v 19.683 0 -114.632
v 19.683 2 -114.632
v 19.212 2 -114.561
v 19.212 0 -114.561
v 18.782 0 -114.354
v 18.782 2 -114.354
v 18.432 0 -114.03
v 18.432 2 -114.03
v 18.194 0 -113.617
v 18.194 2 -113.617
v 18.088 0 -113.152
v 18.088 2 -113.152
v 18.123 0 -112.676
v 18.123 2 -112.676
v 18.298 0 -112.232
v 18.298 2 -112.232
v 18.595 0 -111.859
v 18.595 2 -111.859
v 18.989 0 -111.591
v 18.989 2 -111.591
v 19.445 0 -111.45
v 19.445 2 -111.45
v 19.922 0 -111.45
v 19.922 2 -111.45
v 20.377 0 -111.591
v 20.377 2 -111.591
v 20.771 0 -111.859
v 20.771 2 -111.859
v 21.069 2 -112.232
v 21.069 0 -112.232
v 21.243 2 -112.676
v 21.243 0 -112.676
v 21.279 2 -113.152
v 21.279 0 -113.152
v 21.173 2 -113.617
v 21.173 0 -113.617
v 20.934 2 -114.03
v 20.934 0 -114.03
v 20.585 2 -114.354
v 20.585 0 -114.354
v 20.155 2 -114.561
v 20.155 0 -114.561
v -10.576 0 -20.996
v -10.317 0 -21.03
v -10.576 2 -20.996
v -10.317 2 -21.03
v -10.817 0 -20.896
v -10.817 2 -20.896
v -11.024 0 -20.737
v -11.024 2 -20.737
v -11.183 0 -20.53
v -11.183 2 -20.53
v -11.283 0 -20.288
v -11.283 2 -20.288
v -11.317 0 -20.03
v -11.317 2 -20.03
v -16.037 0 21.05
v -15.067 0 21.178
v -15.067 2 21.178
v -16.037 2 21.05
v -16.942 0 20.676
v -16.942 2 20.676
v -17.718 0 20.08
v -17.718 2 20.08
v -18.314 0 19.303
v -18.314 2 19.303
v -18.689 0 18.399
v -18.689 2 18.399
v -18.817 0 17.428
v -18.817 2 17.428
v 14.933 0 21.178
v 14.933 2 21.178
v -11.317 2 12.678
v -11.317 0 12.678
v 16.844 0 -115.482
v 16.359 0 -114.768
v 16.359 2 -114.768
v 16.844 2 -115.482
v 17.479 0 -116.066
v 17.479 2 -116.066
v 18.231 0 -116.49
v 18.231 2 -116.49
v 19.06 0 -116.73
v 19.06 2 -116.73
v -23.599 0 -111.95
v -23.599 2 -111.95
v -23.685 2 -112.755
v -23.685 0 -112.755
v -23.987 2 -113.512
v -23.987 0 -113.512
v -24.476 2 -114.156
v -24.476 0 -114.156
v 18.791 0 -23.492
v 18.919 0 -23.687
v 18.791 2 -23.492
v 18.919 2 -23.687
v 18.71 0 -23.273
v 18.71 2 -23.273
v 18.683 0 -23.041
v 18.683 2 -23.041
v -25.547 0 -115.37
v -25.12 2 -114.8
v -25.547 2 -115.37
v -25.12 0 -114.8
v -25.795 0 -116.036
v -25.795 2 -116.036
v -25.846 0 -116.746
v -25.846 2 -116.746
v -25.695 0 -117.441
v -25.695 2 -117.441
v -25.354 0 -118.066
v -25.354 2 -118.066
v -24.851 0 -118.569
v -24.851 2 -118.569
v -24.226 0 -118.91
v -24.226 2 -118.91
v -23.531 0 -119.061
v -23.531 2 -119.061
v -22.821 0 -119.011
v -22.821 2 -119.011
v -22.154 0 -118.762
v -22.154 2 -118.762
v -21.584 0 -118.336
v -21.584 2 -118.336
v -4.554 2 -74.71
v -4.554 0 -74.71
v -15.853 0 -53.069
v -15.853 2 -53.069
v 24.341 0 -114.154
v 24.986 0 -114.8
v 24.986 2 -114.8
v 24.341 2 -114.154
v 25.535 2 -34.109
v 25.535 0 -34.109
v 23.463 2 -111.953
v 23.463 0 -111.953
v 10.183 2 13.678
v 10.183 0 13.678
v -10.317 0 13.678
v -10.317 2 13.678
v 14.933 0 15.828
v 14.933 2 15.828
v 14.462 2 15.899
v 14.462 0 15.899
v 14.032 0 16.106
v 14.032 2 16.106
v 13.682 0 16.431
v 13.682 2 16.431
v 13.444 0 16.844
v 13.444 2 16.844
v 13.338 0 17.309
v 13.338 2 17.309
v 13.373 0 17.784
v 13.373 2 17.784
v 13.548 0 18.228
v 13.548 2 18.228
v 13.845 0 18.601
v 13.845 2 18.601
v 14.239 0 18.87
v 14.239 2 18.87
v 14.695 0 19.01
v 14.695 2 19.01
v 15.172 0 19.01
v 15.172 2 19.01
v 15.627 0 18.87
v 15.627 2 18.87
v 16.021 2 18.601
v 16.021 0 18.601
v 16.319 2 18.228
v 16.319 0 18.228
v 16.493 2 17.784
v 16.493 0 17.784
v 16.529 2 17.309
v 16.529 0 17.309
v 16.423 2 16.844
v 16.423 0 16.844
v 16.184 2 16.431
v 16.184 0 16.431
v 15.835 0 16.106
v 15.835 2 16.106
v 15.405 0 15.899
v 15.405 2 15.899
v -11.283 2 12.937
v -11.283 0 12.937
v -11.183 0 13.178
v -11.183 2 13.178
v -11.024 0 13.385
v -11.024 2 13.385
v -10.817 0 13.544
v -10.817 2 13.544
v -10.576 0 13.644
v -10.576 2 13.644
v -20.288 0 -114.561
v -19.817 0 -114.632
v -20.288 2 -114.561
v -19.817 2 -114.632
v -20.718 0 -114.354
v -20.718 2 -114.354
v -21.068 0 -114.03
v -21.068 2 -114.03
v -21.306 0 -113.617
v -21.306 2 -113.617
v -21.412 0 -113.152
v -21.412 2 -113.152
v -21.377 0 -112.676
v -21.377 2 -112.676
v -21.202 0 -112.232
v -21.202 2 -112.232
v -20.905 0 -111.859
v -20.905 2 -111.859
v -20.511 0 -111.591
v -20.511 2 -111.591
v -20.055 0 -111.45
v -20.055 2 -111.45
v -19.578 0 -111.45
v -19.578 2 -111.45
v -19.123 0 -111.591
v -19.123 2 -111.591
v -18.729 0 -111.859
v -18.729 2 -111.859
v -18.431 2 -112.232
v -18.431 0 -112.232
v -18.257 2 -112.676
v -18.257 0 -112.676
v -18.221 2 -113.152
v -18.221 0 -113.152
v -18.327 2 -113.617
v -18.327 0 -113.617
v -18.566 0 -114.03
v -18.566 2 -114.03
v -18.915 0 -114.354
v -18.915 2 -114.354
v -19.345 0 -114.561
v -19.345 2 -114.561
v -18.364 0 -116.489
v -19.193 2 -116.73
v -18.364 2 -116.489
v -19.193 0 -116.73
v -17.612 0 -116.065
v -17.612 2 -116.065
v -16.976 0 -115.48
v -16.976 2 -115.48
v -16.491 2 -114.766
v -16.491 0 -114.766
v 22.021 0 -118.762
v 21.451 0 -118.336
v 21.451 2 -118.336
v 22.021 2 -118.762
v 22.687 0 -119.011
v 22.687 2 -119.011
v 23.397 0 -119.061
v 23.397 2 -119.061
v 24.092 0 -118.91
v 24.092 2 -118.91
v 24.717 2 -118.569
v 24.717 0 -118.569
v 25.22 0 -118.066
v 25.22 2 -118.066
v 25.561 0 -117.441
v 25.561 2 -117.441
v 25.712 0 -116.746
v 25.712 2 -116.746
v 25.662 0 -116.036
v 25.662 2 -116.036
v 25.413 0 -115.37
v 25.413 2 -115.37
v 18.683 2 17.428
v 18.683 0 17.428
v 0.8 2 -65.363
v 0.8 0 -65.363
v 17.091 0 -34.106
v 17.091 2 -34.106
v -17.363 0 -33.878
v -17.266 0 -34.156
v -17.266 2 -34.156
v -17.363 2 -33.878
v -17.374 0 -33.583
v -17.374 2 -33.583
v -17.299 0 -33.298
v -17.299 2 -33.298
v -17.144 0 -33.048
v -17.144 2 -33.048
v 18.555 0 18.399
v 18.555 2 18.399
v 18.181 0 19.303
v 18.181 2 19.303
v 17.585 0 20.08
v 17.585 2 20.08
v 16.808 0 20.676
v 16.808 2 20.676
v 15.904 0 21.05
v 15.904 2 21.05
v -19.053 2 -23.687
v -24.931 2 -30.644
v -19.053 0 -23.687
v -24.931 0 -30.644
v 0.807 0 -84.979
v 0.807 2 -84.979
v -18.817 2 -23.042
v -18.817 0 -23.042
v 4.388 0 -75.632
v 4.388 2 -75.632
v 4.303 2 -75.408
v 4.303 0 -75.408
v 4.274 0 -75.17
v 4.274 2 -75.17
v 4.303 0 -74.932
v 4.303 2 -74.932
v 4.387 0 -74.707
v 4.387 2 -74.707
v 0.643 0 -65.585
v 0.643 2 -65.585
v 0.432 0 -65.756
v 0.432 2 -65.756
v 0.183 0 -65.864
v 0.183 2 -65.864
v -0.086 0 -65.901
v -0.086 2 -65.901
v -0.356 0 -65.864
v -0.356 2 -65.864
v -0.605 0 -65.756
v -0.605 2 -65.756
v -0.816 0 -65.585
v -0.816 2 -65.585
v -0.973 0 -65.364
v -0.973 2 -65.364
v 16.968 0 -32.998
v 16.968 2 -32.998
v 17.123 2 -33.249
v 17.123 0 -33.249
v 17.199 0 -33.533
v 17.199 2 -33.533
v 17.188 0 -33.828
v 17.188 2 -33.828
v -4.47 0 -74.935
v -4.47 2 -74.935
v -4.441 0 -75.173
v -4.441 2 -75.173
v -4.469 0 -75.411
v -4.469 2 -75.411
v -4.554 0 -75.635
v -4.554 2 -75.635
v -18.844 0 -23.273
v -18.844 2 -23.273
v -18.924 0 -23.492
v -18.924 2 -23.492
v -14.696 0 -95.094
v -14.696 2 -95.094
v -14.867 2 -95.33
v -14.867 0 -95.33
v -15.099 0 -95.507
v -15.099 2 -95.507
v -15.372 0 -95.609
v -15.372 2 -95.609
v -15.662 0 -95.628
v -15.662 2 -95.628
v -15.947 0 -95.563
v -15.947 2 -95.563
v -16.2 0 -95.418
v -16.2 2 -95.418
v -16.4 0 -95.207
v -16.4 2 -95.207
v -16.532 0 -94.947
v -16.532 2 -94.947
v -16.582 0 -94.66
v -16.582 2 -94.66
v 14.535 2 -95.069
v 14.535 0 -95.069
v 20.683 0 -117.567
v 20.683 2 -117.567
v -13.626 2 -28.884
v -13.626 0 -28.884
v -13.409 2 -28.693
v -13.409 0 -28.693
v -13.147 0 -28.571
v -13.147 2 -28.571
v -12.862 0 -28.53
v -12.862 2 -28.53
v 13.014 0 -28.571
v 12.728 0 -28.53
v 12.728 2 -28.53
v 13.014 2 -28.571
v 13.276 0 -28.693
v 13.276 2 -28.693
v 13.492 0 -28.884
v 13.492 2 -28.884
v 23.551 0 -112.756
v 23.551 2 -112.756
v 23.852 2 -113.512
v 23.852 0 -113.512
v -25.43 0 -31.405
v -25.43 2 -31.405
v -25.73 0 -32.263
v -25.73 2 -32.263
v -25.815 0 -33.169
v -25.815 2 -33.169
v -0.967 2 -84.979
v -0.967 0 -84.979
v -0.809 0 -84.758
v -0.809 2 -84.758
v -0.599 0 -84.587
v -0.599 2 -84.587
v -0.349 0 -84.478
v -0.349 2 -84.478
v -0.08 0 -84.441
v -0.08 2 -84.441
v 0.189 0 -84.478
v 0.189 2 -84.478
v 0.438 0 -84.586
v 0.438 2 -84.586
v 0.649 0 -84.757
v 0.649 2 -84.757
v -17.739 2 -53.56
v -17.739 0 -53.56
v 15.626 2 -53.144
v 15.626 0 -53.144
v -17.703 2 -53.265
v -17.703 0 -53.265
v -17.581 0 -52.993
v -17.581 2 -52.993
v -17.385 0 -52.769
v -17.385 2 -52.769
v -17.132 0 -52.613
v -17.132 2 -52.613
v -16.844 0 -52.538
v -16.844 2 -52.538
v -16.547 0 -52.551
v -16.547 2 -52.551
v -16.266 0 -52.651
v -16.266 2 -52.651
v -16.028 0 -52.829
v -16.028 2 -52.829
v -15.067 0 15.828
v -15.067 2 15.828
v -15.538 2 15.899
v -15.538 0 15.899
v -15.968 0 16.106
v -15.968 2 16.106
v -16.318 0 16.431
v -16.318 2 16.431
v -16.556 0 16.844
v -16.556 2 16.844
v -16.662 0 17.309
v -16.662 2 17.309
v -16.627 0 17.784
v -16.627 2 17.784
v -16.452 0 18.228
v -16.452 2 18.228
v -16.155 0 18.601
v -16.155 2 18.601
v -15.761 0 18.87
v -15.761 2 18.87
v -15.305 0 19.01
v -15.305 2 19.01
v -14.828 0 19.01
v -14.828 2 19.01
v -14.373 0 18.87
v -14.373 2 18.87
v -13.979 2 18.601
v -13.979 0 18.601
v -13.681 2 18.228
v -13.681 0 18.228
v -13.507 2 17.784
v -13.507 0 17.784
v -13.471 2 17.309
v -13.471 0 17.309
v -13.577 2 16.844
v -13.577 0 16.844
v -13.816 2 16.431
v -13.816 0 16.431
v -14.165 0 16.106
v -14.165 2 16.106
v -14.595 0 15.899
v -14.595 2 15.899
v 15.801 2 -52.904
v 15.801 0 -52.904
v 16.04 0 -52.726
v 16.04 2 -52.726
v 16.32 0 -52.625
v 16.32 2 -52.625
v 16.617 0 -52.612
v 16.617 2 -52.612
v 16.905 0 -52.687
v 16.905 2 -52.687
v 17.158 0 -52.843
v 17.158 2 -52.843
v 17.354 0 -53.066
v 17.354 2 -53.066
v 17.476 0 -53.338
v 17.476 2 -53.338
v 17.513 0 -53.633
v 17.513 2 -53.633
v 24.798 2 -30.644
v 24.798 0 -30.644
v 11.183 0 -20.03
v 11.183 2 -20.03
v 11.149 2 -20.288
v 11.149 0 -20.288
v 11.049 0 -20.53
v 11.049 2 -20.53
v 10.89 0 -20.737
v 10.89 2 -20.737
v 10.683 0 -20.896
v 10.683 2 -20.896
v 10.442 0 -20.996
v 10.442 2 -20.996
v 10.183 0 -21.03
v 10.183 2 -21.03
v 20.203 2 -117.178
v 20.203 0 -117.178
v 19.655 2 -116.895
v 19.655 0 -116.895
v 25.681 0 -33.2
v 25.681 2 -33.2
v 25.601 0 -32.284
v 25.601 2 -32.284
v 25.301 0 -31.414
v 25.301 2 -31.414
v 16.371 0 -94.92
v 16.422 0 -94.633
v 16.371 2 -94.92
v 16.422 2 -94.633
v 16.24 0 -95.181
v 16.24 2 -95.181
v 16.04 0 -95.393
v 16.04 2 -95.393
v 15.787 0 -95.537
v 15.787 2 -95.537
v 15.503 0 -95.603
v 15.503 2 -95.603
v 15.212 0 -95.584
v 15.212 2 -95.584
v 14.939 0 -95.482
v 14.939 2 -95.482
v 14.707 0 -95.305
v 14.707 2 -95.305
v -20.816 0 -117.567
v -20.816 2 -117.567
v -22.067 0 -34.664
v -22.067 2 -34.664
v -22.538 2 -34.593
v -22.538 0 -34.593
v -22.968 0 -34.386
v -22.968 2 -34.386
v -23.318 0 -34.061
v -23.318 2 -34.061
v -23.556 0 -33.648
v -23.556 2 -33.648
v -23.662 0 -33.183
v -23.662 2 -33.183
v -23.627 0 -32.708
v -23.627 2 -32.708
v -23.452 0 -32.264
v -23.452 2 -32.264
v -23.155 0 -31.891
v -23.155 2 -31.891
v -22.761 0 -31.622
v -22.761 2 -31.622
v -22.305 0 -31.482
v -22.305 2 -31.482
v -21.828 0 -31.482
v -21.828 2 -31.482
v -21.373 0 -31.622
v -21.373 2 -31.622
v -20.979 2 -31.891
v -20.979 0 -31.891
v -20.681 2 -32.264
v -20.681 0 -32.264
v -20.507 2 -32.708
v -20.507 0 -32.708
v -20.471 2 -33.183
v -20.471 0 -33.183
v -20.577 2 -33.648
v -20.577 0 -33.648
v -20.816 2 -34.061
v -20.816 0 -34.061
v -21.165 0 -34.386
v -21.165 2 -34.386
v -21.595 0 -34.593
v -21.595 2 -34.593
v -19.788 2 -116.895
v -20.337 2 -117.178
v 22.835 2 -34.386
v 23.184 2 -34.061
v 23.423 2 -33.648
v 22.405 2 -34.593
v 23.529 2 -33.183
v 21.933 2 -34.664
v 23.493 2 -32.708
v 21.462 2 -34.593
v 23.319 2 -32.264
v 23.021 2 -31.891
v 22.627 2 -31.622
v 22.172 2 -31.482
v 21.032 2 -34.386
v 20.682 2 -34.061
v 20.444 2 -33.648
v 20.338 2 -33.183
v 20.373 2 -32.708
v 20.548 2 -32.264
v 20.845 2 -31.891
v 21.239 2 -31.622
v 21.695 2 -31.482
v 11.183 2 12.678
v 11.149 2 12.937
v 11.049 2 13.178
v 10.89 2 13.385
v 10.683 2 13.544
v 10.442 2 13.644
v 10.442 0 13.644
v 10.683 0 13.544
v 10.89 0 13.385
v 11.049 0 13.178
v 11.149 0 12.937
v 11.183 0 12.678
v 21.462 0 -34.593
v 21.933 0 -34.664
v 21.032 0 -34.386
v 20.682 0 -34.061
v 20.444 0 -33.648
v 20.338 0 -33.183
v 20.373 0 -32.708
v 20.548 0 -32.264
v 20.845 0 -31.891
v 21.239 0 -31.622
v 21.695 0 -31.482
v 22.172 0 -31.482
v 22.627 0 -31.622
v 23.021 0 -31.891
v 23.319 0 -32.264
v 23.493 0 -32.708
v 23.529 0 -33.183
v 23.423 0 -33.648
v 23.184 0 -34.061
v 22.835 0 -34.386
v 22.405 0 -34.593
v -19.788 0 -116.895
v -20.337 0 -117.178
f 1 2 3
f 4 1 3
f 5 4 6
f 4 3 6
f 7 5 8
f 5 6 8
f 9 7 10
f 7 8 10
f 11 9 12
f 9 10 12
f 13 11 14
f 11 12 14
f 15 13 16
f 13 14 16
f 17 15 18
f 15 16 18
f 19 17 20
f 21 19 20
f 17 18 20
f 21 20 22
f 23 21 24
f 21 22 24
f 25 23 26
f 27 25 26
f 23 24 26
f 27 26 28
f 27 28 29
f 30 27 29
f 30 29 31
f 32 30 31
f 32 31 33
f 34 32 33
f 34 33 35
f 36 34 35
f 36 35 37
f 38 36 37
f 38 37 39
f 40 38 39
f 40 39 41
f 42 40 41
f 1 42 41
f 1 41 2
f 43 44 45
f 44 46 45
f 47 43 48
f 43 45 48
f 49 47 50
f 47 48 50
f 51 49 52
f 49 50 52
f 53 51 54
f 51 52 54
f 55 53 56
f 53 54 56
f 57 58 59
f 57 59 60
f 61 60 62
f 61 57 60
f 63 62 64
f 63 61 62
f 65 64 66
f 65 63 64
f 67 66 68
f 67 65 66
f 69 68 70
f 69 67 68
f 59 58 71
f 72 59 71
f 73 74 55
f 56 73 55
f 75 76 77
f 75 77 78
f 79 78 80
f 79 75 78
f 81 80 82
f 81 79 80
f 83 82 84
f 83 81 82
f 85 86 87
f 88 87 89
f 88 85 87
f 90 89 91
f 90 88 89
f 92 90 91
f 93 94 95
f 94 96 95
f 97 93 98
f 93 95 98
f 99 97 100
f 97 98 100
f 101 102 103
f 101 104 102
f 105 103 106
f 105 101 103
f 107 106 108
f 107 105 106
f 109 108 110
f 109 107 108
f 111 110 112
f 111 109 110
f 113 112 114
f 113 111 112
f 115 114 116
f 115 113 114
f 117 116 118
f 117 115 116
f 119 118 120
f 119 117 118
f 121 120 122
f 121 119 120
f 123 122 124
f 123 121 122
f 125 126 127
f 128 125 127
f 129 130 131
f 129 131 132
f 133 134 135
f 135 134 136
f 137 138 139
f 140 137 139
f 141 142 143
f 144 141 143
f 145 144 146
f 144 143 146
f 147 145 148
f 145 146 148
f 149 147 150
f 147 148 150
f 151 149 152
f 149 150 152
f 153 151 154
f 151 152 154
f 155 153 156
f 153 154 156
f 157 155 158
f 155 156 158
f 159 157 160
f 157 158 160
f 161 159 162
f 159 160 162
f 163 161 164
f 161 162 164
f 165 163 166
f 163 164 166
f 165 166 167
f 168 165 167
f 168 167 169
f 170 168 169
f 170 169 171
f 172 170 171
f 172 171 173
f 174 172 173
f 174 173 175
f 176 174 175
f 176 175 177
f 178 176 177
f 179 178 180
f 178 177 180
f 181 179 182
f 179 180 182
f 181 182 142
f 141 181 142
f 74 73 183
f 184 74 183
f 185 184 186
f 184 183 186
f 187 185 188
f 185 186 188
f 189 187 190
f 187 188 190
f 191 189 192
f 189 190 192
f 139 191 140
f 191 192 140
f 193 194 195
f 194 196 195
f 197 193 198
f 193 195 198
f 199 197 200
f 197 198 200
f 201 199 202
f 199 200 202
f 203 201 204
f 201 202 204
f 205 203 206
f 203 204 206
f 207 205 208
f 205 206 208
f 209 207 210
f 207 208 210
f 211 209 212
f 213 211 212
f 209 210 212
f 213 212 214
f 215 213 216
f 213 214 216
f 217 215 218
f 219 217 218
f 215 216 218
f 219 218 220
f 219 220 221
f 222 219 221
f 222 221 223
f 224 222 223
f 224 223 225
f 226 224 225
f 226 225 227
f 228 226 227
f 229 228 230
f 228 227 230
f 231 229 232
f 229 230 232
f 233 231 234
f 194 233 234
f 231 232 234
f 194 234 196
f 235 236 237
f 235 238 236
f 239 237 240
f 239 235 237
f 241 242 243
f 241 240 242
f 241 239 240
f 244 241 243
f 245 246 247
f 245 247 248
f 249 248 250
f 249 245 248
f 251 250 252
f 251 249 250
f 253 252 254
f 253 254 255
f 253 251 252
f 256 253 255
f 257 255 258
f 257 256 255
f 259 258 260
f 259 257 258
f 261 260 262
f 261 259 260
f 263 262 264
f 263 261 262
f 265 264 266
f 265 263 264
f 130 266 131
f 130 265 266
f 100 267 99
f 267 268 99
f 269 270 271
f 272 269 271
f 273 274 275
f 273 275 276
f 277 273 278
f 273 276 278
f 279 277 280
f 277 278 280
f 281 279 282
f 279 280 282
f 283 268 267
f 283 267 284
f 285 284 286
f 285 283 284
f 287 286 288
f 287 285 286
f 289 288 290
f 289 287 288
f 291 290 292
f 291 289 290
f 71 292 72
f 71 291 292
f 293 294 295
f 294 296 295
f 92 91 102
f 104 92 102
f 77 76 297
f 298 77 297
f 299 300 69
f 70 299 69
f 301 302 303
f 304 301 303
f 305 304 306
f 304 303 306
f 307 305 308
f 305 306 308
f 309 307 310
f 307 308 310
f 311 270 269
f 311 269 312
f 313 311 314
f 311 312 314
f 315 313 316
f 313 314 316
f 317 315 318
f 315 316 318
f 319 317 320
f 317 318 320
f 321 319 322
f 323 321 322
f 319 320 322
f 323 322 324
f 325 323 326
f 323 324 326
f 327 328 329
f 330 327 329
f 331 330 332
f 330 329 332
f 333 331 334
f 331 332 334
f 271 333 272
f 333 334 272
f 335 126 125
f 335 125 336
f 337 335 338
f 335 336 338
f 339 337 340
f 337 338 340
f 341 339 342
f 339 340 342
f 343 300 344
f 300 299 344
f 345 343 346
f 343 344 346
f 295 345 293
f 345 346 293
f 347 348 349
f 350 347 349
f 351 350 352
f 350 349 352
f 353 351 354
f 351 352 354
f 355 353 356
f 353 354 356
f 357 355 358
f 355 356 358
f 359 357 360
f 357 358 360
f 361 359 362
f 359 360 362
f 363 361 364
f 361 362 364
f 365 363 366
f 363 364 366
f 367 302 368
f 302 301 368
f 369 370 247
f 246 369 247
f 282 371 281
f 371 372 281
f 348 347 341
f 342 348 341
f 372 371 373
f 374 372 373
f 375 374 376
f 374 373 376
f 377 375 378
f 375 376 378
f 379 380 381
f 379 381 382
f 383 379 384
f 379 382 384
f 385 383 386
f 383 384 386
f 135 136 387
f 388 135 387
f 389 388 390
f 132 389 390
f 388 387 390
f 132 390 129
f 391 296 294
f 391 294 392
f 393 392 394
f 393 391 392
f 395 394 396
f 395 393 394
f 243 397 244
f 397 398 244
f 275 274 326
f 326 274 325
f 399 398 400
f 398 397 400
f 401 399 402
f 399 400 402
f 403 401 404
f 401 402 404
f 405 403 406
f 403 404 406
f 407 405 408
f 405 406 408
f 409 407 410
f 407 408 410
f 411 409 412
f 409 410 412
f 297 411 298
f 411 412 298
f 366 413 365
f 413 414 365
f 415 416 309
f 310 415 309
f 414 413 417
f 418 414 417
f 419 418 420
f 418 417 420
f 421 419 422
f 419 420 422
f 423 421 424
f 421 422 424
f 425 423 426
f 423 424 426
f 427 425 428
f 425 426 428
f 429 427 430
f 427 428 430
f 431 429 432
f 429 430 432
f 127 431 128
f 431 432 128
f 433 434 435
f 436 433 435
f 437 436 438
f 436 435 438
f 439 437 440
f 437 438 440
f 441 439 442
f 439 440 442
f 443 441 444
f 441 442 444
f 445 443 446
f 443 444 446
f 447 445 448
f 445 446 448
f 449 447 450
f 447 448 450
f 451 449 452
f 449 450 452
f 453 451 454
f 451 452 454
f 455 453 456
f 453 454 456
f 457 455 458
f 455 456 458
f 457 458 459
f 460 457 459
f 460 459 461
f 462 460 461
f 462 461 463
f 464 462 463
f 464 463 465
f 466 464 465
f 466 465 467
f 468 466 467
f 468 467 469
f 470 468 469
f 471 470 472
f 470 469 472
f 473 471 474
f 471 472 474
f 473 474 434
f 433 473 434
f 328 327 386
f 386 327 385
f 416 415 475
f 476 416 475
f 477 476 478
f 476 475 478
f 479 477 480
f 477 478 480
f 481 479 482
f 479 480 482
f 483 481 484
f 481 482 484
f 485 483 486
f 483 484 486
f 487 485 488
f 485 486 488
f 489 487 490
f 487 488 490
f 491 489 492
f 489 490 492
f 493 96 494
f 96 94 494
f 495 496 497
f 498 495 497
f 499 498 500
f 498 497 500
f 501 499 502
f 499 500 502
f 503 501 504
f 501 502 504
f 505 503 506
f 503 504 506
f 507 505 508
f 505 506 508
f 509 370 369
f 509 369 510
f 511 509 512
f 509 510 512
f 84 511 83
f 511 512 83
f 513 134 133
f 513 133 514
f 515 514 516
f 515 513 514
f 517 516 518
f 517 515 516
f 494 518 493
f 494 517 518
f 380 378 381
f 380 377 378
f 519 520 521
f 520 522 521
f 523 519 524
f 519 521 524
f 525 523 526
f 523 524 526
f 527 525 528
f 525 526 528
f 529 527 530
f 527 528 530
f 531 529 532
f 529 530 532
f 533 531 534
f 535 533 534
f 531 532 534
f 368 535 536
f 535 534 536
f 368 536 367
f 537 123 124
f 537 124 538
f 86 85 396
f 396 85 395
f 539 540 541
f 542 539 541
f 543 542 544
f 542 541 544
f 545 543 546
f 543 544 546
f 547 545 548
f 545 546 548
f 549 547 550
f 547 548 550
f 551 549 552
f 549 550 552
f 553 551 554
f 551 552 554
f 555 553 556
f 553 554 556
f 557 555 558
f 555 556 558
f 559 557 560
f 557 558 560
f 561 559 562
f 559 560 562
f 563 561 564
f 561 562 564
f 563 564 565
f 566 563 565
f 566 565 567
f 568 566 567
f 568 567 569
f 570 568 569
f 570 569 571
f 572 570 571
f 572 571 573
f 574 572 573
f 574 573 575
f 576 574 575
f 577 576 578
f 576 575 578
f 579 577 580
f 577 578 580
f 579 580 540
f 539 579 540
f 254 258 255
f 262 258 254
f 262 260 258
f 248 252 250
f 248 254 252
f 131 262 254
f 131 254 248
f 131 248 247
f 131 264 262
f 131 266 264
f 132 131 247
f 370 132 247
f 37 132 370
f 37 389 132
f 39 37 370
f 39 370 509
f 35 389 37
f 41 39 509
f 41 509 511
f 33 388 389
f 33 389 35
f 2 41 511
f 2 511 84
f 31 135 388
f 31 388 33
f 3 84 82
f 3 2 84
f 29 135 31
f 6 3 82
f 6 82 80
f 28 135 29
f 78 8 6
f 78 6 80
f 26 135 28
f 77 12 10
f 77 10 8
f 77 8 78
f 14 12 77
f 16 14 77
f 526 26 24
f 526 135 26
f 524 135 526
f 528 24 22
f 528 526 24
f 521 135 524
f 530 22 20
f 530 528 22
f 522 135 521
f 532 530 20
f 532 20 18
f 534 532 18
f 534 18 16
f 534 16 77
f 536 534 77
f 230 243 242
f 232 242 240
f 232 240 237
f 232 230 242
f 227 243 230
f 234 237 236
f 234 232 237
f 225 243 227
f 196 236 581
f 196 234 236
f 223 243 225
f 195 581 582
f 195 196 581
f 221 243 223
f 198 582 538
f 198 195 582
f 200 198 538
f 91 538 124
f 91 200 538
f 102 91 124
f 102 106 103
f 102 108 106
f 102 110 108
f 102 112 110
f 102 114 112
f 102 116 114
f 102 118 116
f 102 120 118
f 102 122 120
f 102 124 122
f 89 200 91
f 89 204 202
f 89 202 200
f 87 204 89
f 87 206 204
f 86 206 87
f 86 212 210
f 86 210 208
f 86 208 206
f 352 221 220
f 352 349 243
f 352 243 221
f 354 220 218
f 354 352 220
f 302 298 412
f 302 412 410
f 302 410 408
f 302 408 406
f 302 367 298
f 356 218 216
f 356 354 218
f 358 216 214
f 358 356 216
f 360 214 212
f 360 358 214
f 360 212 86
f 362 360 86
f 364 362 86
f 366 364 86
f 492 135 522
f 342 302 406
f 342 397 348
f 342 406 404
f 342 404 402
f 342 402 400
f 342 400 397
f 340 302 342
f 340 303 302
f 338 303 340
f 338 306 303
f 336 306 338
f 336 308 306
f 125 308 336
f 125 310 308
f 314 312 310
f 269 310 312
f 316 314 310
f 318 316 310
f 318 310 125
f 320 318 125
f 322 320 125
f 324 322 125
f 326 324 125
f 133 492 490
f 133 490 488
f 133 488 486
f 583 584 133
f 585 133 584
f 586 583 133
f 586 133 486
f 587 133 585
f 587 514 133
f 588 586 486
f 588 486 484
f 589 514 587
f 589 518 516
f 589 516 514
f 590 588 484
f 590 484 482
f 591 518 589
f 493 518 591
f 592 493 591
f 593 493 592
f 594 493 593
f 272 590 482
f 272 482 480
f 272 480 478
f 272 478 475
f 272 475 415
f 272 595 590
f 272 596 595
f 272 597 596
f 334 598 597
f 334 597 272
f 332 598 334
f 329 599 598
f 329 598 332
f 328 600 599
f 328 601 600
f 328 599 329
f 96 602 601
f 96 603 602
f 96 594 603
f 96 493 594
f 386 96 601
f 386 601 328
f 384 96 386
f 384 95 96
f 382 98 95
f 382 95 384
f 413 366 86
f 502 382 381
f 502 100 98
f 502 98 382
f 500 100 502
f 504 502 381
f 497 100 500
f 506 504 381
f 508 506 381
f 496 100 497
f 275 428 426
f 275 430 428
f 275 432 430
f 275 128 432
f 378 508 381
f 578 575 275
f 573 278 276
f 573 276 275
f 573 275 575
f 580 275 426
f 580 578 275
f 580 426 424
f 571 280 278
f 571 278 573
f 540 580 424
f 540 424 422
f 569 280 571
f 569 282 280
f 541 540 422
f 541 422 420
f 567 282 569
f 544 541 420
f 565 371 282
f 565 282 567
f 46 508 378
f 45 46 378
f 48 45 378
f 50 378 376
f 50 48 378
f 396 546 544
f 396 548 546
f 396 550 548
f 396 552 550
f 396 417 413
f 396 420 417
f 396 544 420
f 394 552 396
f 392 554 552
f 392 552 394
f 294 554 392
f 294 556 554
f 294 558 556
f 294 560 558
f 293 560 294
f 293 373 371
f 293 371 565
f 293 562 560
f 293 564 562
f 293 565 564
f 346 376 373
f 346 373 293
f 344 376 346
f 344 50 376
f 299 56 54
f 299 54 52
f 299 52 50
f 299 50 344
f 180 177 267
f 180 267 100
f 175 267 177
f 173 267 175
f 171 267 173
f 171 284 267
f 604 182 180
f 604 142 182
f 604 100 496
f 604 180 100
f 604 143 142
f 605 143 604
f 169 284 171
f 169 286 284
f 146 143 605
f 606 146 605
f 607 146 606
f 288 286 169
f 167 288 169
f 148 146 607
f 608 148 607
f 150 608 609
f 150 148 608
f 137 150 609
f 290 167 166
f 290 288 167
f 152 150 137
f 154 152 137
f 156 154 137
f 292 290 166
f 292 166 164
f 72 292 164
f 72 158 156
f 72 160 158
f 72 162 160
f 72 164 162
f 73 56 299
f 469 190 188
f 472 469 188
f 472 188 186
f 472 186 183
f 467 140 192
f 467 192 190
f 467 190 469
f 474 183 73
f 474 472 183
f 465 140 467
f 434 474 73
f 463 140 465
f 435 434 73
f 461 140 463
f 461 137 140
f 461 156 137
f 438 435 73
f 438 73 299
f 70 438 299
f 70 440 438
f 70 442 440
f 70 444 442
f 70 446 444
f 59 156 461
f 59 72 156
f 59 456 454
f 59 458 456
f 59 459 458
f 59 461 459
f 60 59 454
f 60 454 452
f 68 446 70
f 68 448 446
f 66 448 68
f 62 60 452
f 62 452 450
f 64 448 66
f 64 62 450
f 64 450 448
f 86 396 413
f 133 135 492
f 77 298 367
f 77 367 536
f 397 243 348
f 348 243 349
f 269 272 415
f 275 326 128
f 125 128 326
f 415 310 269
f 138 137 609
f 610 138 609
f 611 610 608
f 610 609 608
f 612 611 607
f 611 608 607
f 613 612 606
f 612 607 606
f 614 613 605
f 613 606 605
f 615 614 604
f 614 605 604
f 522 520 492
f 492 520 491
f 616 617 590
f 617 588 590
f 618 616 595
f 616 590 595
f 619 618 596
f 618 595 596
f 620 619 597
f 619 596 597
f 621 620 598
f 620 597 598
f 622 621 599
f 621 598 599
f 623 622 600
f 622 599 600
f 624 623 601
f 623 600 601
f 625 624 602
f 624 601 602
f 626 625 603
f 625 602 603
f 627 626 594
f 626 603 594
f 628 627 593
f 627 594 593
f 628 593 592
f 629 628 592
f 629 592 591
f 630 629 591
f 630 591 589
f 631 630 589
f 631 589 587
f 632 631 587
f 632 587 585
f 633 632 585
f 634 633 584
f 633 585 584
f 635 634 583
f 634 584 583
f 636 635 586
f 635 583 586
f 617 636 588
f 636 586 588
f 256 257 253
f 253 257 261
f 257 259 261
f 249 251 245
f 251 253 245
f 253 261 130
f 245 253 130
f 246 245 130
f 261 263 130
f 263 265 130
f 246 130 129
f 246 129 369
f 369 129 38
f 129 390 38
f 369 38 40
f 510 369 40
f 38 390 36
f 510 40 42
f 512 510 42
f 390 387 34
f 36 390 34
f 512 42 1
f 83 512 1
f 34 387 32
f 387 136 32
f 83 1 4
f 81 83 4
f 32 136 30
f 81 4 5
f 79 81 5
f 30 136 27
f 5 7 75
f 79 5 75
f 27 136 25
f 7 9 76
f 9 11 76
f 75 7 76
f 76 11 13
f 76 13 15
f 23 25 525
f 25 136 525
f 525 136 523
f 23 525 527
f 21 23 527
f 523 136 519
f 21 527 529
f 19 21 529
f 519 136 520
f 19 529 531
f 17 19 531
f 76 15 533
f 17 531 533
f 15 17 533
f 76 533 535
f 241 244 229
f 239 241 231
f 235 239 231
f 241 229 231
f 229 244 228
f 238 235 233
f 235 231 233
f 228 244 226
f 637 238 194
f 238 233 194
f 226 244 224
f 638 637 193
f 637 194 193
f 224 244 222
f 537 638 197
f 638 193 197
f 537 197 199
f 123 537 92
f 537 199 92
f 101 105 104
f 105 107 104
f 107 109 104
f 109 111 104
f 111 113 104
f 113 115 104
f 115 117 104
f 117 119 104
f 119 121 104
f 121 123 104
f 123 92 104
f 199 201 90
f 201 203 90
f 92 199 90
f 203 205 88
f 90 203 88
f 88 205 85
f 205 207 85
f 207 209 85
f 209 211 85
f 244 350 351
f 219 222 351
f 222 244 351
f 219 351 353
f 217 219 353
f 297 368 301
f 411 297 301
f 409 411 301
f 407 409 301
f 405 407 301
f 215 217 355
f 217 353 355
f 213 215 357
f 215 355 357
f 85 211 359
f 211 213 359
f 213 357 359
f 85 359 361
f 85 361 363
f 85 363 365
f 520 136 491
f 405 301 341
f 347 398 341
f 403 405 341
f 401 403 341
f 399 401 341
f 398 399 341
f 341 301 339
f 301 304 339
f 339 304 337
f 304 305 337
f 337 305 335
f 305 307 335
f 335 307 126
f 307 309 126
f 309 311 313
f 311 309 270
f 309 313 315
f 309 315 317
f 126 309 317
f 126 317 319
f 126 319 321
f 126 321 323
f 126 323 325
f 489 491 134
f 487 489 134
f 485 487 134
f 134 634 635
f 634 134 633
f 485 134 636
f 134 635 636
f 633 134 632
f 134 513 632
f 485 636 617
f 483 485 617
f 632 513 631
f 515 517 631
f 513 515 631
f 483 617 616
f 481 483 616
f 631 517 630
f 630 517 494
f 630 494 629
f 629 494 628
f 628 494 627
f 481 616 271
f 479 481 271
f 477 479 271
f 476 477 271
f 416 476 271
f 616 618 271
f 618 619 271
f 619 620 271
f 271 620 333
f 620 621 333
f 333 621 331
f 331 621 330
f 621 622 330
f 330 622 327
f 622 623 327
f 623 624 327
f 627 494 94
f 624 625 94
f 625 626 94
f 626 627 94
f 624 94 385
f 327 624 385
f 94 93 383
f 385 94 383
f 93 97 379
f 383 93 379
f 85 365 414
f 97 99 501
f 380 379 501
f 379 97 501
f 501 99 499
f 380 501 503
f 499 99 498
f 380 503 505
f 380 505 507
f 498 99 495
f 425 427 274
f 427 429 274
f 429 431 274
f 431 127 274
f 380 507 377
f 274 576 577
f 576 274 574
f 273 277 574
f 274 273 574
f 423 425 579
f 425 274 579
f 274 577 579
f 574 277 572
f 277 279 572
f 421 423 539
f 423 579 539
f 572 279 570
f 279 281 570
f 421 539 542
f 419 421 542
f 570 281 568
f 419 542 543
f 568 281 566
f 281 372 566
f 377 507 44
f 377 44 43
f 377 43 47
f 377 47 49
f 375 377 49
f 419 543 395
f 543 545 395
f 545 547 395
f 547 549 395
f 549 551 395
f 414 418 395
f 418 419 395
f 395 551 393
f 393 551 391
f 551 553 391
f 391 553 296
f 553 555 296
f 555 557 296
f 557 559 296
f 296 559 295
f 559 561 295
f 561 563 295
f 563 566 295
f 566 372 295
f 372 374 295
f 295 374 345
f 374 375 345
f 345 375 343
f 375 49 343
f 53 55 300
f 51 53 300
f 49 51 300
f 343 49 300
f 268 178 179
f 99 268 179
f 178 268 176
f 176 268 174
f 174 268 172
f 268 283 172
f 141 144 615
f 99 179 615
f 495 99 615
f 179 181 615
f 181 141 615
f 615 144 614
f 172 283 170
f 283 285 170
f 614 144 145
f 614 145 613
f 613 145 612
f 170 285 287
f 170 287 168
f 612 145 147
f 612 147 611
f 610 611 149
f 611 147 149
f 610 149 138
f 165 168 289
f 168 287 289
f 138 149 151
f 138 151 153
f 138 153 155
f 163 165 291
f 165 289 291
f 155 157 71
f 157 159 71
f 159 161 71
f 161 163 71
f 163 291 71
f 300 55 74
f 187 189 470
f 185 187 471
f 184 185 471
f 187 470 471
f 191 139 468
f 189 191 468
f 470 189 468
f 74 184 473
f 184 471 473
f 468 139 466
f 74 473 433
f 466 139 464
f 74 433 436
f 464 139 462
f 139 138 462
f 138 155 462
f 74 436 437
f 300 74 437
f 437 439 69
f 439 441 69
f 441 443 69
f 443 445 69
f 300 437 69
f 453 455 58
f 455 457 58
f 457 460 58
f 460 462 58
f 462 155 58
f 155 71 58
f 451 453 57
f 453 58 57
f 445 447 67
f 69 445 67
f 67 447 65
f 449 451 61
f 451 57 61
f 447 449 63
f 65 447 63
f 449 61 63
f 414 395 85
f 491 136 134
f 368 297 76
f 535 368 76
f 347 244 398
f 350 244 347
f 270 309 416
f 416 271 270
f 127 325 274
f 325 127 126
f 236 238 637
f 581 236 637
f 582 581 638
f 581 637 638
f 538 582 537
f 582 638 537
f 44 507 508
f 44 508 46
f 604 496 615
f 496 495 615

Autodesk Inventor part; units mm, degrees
ref_plane "YZ Plane" through (0, 0, 0) normal (1, 0, 0) x (0, 1, 0)
ref_plane "XZ Plane" through (0, 0, 0) normal (0, 1, 0) x (-1, 0, 0)
ref_plane "XY Plane" through (0, 0, 0) normal (0, 0, 1) x (1, 0, 0)
sketch "Szkic1" plane through (0, 0, 0) normal (0, 1, 0) x (-1, 0, 0)
  line L0 (-14.9332, 17.4281) -> (15.0668, 17.4281) construction
  line L1 (-14.9332, 13.6781) -> (15.0668, 13.6781)
  line L2 (15.0668, 21.1781) -> (-14.9332, 21.1781)
  arc A0 (-14.9332, 21.1781) -> (-14.9332, 13.6781) centre (-14.9332, 17.4281) ccw
  arc A1 (15.0668, 13.6781) -> (15.0668, 21.1781) centre (15.0668, 17.4281) ccw
  line L3 (0.0668, 17.4281) -> (0.0668, -37.9617) construction
  line L4 (15.0668, 17.4281) -> (15.0668, -55.6314) construction
  line L5 (-14.9332, 17.4281) -> (-14.9332, -55.6314) construction
  line L6 (22.0668, -33.0639) -> (15.0668, -24.7796) construction
  line L7 (24.9311, -30.6436) -> (17.9311, -22.3593)
  line L8 (12.2024, -27.1999) -> (19.2024, -35.4842)
  arc A2 (19.2024, -35.4842) -> (24.9311, -30.6436) centre (22.0668, -33.0639) ccw
  arc A3 (17.9311, -22.3593) -> (12.2024, -27.1999) centre (15.0668, -24.7796) ccw
  line L9 (-21.9332, -33.0639) -> (-14.9332, -24.7796) construction
  line L10 (-19.0689, -35.4842) -> (-12.0689, -27.1999)
  line L11 (-17.7976, -22.3593) -> (-24.7976, -30.6436)
  arc A4 (-24.7976, -30.6436) -> (-19.0689, -35.4842) centre (-21.9332, -33.0639) ccw
  arc A5 (-12.0689, -27.1999) -> (-17.7976, -22.3593) centre (-14.9332, -24.7796) ccw
  line L12 (15.0668, 17.4281) -> (15.0668, -24.7796) construction
  line L13 (11.3168, 17.4281) -> (11.3168, -24.7796)
  line L14 (18.8168, -24.7796) -> (18.8168, 17.4281)
  arc A6 (18.8168, 17.4281) -> (11.3168, 17.4281) centre (15.0668, 17.4281) ccw
  arc A7 (11.3168, -24.7796) -> (18.8168, -24.7796) centre (15.0668, -24.7796) ccw
  line L15 (-14.9332, 17.4281) -> (-14.9332, -24.7796) construction
  line L16 (-18.6832, 17.4281) -> (-18.6832, -24.7796)
  line L17 (-11.1832, -24.7796) -> (-11.1832, 17.4281)
  arc A8 (-11.1832, 17.4281) -> (-18.6832, 17.4281) centre (-14.9332, 17.4281) ccw
  arc A9 (-18.6832, -24.7796) -> (-11.1832, -24.7796) centre (-14.9332, -24.7796) ccw
  line L18 (-14.9332, -24.7796) -> (15.0668, -24.7796) construction
  line L19 (-14.9332, -21.0296) -> (15.0668, -21.0296)
  line L20 (15.0668, -28.5296) -> (-14.9332, -28.5296)
  arc A10 (-14.9332, -21.0296) -> (-14.9332, -28.5296) centre (-14.9332, -24.7796) ccw
  arc A11 (15.0668, -28.5296) -> (15.0668, -21.0296) centre (15.0668, -24.7796) ccw
  line L21 (22.0668, -33.0639) -> (19.8168, -113.0323) construction
  line L22 (18.3183, -32.9584) -> (16.0683, -112.9268)
  line L23 (23.5653, -113.1377) -> (25.8153, -33.1694)
  arc A12 (25.8153, -33.1694) -> (18.3183, -32.9584) centre (22.0668, -33.0639) ccw
  arc A13 (16.0683, -112.9268) -> (23.5653, -113.1377) centre (19.8168, -113.0323) ccw
  line L24 (-21.8084, -33.1694) -> (-19.6832, -113.0323) construction
  line L25 (-25.5571, -33.2691) -> (-23.4319, -113.132)
  line L26 (-15.9346, -112.9325) -> (-18.0597, -33.0696)
  arc A14 (-18.0597, -33.0696) -> (-25.5571, -33.2691) centre (-21.8084, -33.1694) ccw
  arc A15 (-23.4319, -113.132) -> (-15.9346, -112.9325) centre (-19.6832, -113.0323) ccw
  line L27 (22.0668, -33.0639) -> (-19.6832, -113.0323) construction
  line L28 (18.7425, -31.3284) -> (-23.0075, -111.2967)
  line L29 (-16.359, -114.7678) -> (25.391, -34.7994)
  arc A16 (25.391, -34.7994) -> (18.7425, -31.3284) centre (22.0668, -33.0639) ccw
  arc A17 (-23.0075, -111.2967) -> (-16.359, -114.7678) centre (-19.6832, -113.0323) ccw
  line L30 (-21.8084, -33.1694) -> (19.8168, -113.0323) construction
  line L31 (-25.1338, -34.9026) -> (16.4914, -114.7655)
  line L32 (23.1422, -111.299) -> (-18.483, -31.4361)
  arc A18 (-18.483, -31.4361) -> (-25.1338, -34.9026) centre (-21.8084, -33.1694) ccw
  arc A19 (16.4914, -114.7655) -> (23.1422, -111.299) centre (19.8168, -113.0323) ccw
  point P0 (0, 0)
  point P1 (18.5668, -28.9217)
  point P2 (-18.4332, -28.9217)
  point P3 (15.0668, -3.6757)
  point P4 (-14.9332, -3.6757)
  point P5 (0.0668, -24.7796)
  point P6 (20.9418, -73.0481)
  point P7 (-20.7458, -73.1008)
  point P8 (1.1918, -73.0481)
  point P9 (-0.9958, -73.1008)
  point P10 (-18.6832, -23.4074)
  point P11 (-25.5347, -34.1087)
  point P12 (0.0805, -83.2794)
  point P13 (24.9311, -30.6436)
  point P14 (18.8168, -23.4074)
  point P15 (4.3129, -75.1727)
  point P16 (17.8606, -49.2232)
  point P17 (16.474, -98.5053)
  point P18 (-4.1462, -75.1698)
  point P19 (-16.319, -98.4856)
  point P20 (-17.6277, -49.3039)
  point P21 (0.0861, -67.0631)
  point P22 (-17.4016, -33.511)
  point P23 (-13.1924, -28.5296)
  point P24 (13.3259, -28.5296)
  point P25 (17.5771, -33.5607)
  point P26 (11.3168, 13.6781)
  point P27 (11.3168, -21.0296)
  point P28 (-11.1832, -21.0296)
  point P29 (-11.1832, 13.6781)
  dimension "d0" = 7.5
  dimension "d1" = 7.5
  dimension "d2" = 7.5
  dimension "d3" = 7.5
  dimension "d4" = 7.5
  dimension "d5" = 7.5
  dimension "d6" = 7.5
extrude "Wyciągnięcie proste1" add sketch "Szkic1" along normal blind 2 contours A0 A8 L17 L1 | L1 L17 L19 A5 L11 L16 A0 | L17 A8 L2 A6 L13 L1 | L13 A6 A1 L1 | L1 A1 L14 L7 A3 L19 L13 | L19 L13 A3 L8 L20 L10 A5 L17 | L17 A5 L19 | L16 A9 L20 L10 L32 A14 L25 A4 L11 | L11 A10 L16 | L19 A3 L13 | A5 A9 A10 | A3 A11 A7 | L10 L20 A9 | L25 A18 L31 A4 | A4 L31 L26 L28 A17 L25 | L14 A11 L7 | L7 A12 L28 L8 L20 A7 L14 | A7 L20 L8 | L31 A18 A14 L26 L10 A4 | A4 L10 L26 L31 | A17 L28 L26 A15 | A2 L8 L22 A12 | L32 L28 L31 L26 L10 | L10 L26 A14 L32 | A15 L26 L28 L31 L29 | L23 A19 L32 L22 L29 A2 | A12 L22 L8 L28 | L8 L22 L29 L32 L28 | L32 L29 L31 L28 | L29 L32 L22 A13 L31 | L29 L22 L8 A2 | A13 L22 L32 A19
fillet "Zaokrąglenie1" radius 1 18 edges at (-0.0805, 1, -83.2794) (-4.3129, 1, -75.1727) (4.1462, 1, -75.1698) (-0.0861, 1, -67.0631) (-17.8606, 1, -49.2232) (-16.474, 1, -98.5053) (16.319, 1, -98.4856) (17.6277, 1, -49.3039) (17.4016, 1, -33.511) (13.1924, 1, -28.5296) (-18.8168, 1, -23.4074) (-17.5771, 1, -33.5607) (-13.3259, 1, -28.5296) (-11.3168, 1, -21.0296) (11.1832, 1, -21.0296) (11.1832, 1, 13.6781) (-11.3168, 1, 13.6781) (18.6832, 1, -23.4074)
sketch "Szkic5" plane through (0, 0, 0) normal (0, -1, 0) x (1, 0, 0)
  arc A0 (18.6832, 17.4281) -> (14.9332, 21.1781) centre (14.9332, 17.4281) ccw projected
  arc A1 (-15.0668, 21.1781) -> (-18.8168, 17.4281) centre (-15.0668, 17.4281) ccw projected
  arc A2 (25.5347, -34.1087) -> (24.7976, -30.6436) centre (21.9332, -33.0639) ccw projected
  arc A3 (-24.9311, -30.6436) -> (-25.8153, -33.1694) centre (-22.0668, -33.0639) ccw projected
  arc A4 (16.359, -114.7678) -> (23.4319, -113.132) centre (19.6832, -113.0323) ccw projected
  arc A5 (-23.5653, -113.1377) -> (-16.4914, -114.7655) centre (-19.8168, -113.0323) ccw projected
  point P0 (0, 0)
hole "Otwór2" at (21.9332, 0, -33.0639) at (-22.0668, 0, -33.0639) at (14.9332, 0, 17.4281) at (-15.0668, 0, 17.4281) at (19.6832, 0, -113.0323) at (-19.8168, 0, -113.0323) direction (0, 1, 0) diameter 3.2 depth 6
sketch "Szkic6" plane through (0, 0, 0) normal (0, -1, 0) x (1, 0, 0)
  circle A0 centre (19.6832, -113.0323) radius 1.6 projected
  circle A1 centre (-19.8168, -113.0323) radius 1.6 projected
  line L0 (19.6832, -113.0323) -> (23.2188, -116.5678) construction
  line L1 (17.9155, -114.8) -> (21.451, -118.3356)
  line L2 (24.9865, -114.8) -> (21.451, -111.2645)
  arc A2 (21.451, -111.2645) -> (17.9155, -114.8) centre (19.6832, -113.0323) ccw
  arc A3 (21.451, -118.3356) -> (24.9865, -114.8) centre (23.2188, -116.5678) ccw
  line L3 (-19.8168, -113.0323) -> (-23.3523, -116.5678) construction
  line L4 (-21.5845, -111.2645) -> (-25.1201, -114.8)
  line L5 (-21.5845, -118.3356) -> (-18.049, -114.8)
  arc A4 (-18.049, -114.8) -> (-21.5845, -111.2645) centre (-19.8168, -113.0323) ccw
  arc A5 (-25.1201, -114.8) -> (-21.5845, -118.3356) centre (-23.3523, -116.5678) ccw
  line L6 (12.7282, -28.5296) -> (-12.8617, -28.5296) projected
  point P0 (0, 0)
  point P1 (21.451, -114.8)
  point P2 (-21.5845, -114.8)
  dimension "d29" = 5
  dimension "d30" = 5
  dimension "d31" = 5
  dimension "d32" = 5
  dimension "d33" = 45
extrude "Wyciągnięcie proste3" add sketch "Szkic6" against normal blind 2
fillet "Zaokrąglenie3" radius 3 4 edges at (19.8919, 1, -116.7764) (23.4274, 1, -113.2409) (-20.0254, 1, -116.7764) (-23.561, 1, -113.2409)
properties part number "mocowanie"
